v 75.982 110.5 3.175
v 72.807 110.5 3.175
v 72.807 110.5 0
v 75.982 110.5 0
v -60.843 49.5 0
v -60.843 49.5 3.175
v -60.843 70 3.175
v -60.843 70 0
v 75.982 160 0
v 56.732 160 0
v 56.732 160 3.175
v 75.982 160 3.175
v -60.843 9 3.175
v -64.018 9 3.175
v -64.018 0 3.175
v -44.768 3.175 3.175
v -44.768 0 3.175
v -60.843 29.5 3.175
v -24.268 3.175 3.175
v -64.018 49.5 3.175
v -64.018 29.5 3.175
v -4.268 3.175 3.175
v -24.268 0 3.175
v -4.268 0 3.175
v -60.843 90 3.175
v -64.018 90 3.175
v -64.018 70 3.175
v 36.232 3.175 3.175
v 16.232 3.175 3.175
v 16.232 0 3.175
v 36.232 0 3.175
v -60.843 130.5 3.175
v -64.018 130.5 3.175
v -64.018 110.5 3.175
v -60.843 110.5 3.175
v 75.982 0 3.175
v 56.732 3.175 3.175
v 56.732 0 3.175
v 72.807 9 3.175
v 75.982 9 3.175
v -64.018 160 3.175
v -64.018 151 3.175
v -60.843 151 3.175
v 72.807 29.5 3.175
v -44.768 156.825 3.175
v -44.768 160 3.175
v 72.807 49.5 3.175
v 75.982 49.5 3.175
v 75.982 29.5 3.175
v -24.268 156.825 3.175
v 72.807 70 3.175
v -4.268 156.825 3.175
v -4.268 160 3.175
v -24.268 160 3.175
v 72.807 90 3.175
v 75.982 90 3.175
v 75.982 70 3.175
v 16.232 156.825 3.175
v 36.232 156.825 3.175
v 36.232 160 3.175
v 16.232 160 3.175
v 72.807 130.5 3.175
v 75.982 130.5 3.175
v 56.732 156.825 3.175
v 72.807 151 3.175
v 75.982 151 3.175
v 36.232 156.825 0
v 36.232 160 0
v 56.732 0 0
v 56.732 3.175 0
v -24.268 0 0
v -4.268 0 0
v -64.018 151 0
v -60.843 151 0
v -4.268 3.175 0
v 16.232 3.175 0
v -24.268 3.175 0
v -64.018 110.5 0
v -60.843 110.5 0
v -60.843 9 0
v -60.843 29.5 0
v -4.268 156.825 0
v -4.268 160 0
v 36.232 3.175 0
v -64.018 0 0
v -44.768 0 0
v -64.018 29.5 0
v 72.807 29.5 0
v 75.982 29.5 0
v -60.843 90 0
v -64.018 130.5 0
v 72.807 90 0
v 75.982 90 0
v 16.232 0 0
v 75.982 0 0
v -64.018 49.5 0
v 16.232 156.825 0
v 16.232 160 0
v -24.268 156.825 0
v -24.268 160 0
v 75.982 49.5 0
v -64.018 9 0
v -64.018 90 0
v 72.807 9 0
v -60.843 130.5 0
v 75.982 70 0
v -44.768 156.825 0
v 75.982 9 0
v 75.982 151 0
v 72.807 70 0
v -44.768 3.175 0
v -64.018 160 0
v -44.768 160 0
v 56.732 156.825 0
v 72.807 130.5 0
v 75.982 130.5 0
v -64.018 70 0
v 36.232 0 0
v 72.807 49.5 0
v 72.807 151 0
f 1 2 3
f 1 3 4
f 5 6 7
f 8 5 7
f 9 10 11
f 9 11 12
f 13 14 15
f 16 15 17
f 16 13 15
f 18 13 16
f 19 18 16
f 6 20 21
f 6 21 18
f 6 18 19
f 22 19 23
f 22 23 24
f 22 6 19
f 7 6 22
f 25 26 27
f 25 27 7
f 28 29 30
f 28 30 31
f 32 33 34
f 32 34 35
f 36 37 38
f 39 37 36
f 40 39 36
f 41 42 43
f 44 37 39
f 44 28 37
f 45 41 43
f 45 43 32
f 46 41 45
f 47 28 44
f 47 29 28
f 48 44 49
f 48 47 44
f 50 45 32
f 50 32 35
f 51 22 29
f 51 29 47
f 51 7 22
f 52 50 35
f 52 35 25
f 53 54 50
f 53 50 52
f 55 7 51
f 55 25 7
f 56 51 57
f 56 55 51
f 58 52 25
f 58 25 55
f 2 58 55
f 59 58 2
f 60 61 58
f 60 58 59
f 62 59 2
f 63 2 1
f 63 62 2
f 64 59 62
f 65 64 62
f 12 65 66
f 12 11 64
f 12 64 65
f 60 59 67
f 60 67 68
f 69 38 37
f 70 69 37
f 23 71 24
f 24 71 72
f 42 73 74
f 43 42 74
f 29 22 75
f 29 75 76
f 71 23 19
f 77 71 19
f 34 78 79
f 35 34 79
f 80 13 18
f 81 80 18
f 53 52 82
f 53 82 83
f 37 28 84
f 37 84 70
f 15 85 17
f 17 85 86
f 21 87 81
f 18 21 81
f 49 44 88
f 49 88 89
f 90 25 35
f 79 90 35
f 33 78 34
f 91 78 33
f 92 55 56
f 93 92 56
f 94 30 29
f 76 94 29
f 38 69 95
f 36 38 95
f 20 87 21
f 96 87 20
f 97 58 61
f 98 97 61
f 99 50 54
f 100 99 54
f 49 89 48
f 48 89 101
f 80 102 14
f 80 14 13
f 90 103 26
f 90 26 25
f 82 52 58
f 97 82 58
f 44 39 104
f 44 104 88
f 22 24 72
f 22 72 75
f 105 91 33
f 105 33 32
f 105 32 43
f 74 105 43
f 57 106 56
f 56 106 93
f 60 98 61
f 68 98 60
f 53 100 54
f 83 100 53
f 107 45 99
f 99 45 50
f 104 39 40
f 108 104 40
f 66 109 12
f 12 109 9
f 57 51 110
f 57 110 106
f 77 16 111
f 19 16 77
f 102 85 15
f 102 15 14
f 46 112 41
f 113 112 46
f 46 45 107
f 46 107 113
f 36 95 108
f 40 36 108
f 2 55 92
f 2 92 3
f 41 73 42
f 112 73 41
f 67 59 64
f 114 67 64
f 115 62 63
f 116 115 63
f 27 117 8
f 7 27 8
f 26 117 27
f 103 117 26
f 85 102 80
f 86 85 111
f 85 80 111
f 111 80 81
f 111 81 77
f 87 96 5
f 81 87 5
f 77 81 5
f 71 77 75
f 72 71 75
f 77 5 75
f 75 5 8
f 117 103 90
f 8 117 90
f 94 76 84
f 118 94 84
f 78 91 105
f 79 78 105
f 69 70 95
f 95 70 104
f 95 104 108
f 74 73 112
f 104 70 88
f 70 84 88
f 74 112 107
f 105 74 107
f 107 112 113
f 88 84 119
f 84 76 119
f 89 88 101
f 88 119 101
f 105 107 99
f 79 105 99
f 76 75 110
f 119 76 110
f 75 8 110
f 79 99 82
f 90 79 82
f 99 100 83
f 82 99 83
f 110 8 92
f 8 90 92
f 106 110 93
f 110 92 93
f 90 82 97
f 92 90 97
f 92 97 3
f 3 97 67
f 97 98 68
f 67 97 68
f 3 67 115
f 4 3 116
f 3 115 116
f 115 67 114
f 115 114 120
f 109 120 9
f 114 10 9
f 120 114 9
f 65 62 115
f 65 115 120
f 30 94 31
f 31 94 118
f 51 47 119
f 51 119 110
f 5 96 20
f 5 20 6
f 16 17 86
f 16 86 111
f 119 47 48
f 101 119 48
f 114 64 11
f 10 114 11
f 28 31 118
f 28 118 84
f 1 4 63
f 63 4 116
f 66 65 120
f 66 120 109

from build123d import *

# Parameters (mm, degrees)
SKETCH1_W           = 140
SKETCH1_H           = 160
BOSS_EXTRUDE1_DEPTH = 3.175
SKETCH2_W           = 3.175
SKETCH2_H           = 20.5
SKETCH2_W_2         = 20.5
SKETCH2_H_2         = 3.175
CUT_EXTRUDE1_DEPTH  = 3.175


with BuildPart() as part:
    # Sketch1 → Boss-Extrude1 (new body)
    with BuildSketch(Plane.XY):
        with Locations((5.981871877, 80)):
            Rectangle(SKETCH1_W, SKETCH1_H)
    extrude(amount=BOSS_EXTRUDE1_DEPTH)

    # Sketch2 → Cut-Extrude1 (cut)
    with BuildSketch(Plane.XY.offset(3.175)):
        with Locations((-62.430628123, 19.25)):
            Rectangle(SKETCH2_W, SKETCH2_H)
        with Locations((-62.430628123, 59.75)):
            Rectangle(SKETCH2_W, SKETCH2_H)
        with Locations((-62.430628123, 100.25)):
            Rectangle(SKETCH2_W, SKETCH2_H)
        with Locations((-62.430628123, 140.75)):
            Rectangle(SKETCH2_W, SKETCH2_H)
        with Locations((-34.518128123, 158.4125)):
            Rectangle(SKETCH2_W_2, SKETCH2_H_2)
        with Locations((5.981871877, 158.4125)):
            Rectangle(SKETCH2_W_2, SKETCH2_H_2)
        with Locations((46.481871877, 158.4125)):
            Rectangle(SKETCH2_W_2, SKETCH2_H_2)
        with Locations((74.394371877, 140.75)):
            Rectangle(SKETCH2_W, SKETCH2_H)
        with Locations((74.394371877, 100.25)):
            Rectangle(SKETCH2_W, SKETCH2_H)
        with Locations((74.394371877, 59.75)):
            Rectangle(SKETCH2_W, SKETCH2_H)
        with Locations((74.394371877, 19.25)):
            Rectangle(SKETCH2_W, SKETCH2_H)
        with Locations((46.481871877, 1.5875)):
            Rectangle(SKETCH2_W_2, SKETCH2_H_2)
        with Locations((5.981871877, 1.5875)):
            Rectangle(SKETCH2_W_2, SKETCH2_H_2)
        with Locations((-34.518128123, 1.5875)):
            Rectangle(SKETCH2_W_2, SKETCH2_H_2)
    extrude(amount=-CUT_EXTRUDE1_DEPTH, mode=Mode.SUBTRACT)


solid = part.part
